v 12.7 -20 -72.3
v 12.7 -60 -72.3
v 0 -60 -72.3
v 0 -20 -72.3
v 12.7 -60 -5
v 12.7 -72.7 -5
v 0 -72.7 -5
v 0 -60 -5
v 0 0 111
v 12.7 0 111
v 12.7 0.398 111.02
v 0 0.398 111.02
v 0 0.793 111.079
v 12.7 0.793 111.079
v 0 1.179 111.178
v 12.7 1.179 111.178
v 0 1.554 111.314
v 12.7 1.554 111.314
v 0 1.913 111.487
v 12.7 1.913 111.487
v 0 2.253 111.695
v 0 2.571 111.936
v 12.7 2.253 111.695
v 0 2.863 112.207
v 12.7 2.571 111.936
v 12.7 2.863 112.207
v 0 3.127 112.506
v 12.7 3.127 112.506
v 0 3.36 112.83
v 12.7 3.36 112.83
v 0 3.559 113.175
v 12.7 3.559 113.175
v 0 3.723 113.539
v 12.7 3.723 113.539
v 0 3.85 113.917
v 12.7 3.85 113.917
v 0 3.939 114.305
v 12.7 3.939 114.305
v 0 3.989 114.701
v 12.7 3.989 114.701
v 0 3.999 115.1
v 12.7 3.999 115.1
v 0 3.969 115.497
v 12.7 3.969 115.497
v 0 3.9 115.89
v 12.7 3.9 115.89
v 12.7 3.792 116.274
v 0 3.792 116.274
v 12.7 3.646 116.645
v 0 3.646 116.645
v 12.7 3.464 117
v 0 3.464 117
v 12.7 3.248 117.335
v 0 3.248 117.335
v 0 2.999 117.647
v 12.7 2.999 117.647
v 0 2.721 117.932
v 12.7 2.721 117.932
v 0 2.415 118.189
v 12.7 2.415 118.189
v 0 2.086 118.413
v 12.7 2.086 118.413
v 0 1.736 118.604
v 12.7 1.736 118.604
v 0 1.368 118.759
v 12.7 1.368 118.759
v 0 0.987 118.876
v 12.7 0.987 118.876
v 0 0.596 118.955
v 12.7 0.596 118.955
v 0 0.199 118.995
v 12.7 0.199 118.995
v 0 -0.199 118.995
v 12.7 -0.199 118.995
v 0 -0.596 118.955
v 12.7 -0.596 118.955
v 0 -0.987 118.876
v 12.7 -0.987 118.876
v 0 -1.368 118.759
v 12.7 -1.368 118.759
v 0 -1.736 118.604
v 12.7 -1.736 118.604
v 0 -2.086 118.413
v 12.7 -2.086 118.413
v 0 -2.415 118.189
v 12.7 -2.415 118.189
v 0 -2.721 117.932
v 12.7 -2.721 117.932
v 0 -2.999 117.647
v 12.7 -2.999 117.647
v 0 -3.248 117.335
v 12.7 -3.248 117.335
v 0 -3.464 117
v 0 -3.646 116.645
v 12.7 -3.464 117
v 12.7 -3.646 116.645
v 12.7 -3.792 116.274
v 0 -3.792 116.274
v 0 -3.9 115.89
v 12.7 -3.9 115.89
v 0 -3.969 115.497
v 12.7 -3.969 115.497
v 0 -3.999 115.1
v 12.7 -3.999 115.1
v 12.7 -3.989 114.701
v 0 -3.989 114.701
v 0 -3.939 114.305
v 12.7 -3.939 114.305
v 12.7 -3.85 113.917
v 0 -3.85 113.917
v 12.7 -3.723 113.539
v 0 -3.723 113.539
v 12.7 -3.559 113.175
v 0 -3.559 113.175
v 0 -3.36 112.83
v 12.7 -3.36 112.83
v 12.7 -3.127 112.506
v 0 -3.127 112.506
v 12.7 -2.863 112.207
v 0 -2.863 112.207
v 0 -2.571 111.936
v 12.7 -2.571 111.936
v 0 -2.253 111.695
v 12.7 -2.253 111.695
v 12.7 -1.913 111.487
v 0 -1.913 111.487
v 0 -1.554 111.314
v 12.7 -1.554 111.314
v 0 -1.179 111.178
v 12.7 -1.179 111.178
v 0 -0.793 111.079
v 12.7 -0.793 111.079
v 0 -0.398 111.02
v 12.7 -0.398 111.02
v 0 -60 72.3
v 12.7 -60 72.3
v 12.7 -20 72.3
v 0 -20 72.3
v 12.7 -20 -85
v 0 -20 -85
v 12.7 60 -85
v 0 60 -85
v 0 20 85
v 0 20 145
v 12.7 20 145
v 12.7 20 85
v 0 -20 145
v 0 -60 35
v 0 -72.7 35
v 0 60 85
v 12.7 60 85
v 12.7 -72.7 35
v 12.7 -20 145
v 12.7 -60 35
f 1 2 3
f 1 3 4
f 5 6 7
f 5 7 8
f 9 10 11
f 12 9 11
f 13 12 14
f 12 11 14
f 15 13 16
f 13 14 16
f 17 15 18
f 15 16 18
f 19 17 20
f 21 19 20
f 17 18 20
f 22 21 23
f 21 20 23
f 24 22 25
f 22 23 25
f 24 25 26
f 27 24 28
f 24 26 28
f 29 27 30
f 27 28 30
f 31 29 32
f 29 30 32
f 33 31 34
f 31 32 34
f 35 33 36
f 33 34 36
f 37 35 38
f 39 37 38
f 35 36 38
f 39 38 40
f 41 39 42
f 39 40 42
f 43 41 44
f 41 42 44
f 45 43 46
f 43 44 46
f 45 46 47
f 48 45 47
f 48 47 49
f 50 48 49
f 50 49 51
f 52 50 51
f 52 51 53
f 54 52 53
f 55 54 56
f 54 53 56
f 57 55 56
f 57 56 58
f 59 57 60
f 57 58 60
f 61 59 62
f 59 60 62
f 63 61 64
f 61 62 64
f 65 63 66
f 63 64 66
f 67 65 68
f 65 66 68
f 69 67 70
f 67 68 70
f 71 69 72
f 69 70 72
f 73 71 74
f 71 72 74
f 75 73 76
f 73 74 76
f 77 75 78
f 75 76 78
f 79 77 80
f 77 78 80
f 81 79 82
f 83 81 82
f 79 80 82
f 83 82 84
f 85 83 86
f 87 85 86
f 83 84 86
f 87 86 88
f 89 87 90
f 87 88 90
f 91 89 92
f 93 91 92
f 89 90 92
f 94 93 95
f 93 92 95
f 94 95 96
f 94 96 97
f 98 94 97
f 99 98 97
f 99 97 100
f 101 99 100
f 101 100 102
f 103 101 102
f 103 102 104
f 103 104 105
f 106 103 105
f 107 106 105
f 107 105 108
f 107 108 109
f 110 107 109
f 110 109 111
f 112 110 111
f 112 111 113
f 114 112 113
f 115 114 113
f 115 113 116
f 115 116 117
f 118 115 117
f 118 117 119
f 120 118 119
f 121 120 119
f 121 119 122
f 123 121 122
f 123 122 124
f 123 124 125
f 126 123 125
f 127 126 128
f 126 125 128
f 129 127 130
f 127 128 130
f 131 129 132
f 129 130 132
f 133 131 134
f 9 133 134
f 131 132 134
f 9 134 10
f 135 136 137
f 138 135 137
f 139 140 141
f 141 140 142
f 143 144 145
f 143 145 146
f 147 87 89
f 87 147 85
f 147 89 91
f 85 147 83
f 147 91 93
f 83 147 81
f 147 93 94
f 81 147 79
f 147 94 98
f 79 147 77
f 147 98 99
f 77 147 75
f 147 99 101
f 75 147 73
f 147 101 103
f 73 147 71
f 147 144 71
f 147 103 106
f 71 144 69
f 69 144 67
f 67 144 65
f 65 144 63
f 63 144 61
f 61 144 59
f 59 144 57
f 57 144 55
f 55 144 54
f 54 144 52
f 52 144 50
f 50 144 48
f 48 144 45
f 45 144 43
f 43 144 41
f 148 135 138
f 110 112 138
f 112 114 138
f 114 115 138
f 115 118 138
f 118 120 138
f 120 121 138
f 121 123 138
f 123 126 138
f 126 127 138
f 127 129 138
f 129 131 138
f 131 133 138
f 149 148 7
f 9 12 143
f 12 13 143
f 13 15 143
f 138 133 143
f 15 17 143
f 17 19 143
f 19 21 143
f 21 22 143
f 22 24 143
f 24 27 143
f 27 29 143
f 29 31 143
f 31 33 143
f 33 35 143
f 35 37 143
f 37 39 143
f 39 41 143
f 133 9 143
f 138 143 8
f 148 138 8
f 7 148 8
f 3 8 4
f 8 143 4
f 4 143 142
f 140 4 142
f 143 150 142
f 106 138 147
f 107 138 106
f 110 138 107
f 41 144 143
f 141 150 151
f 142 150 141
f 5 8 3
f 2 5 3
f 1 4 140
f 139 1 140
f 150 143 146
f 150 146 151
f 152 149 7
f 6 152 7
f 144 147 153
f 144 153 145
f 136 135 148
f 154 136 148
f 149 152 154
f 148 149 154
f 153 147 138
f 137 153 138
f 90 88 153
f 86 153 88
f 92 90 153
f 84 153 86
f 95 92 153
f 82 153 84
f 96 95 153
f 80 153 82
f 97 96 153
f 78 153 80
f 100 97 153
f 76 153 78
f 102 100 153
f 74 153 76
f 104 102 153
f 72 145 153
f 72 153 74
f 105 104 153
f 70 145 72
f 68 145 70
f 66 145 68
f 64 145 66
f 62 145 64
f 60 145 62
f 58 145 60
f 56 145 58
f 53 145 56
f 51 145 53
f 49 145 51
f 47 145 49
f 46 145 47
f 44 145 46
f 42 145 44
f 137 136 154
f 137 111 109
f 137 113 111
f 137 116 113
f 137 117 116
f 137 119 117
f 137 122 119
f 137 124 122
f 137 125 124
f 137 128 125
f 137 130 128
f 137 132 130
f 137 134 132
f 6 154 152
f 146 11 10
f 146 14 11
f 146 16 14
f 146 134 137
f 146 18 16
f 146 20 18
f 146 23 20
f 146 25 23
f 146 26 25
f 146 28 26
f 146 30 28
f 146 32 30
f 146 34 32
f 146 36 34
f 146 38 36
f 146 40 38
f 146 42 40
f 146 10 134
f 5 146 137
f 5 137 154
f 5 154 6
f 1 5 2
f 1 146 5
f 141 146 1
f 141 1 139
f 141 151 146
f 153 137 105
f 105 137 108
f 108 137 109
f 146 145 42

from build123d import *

# Parameters (mm, degrees)
SKETCH1_W           = 170
SKETCH1_H           = 120
SKETCH1_W_2         = 40
SKETCH1_H_2         = 12.7
SKETCH1_W_3         = 60
SKETCH1_H_3         = 40
BOSS_EXTRUDE1_DEPTH = 12.7
SKETCH2_R           = 4
SKETCH2_W           = 12.7
SKETCH2_H           = 40
CUT_EXTRUDE1_DEPTH  = 12.7


with BuildPart() as part:
    # Sketch1 → Boss-Extrude1 (new body)
    with BuildSketch(Plane(origin=(0, 0, 0), x_dir=(0, 0, -1), z_dir=(1, 0, 0))):
        Rectangle(SKETCH1_W, SKETCH1_H)
        with Locations((-15, -66.35)):
            Rectangle(SKETCH1_W_2, SKETCH1_H_2)
        with Locations((-115, 0)):
            Rectangle(SKETCH1_W_3, SKETCH1_H_3)
    extrude(amount=BOSS_EXTRUDE1_DEPTH)

    # Sketch2 → Cut-Extrude1 (cut)
    with BuildSketch(Plane(origin=(12.7, 0, 0), x_dir=(0, 0, -1), z_dir=(1, 0, 0))):
        with Locations((-115, 0)):
            Circle(SKETCH2_R)
        with Locations((-78.65, -40)):
            Rectangle(SKETCH2_W, SKETCH2_H)
        with Locations((78.65, -40)):
            Rectangle(SKETCH2_W, SKETCH2_H)
    extrude(amount=-CUT_EXTRUDE1_DEPTH, mode=Mode.SUBTRACT)


solid = part.part
